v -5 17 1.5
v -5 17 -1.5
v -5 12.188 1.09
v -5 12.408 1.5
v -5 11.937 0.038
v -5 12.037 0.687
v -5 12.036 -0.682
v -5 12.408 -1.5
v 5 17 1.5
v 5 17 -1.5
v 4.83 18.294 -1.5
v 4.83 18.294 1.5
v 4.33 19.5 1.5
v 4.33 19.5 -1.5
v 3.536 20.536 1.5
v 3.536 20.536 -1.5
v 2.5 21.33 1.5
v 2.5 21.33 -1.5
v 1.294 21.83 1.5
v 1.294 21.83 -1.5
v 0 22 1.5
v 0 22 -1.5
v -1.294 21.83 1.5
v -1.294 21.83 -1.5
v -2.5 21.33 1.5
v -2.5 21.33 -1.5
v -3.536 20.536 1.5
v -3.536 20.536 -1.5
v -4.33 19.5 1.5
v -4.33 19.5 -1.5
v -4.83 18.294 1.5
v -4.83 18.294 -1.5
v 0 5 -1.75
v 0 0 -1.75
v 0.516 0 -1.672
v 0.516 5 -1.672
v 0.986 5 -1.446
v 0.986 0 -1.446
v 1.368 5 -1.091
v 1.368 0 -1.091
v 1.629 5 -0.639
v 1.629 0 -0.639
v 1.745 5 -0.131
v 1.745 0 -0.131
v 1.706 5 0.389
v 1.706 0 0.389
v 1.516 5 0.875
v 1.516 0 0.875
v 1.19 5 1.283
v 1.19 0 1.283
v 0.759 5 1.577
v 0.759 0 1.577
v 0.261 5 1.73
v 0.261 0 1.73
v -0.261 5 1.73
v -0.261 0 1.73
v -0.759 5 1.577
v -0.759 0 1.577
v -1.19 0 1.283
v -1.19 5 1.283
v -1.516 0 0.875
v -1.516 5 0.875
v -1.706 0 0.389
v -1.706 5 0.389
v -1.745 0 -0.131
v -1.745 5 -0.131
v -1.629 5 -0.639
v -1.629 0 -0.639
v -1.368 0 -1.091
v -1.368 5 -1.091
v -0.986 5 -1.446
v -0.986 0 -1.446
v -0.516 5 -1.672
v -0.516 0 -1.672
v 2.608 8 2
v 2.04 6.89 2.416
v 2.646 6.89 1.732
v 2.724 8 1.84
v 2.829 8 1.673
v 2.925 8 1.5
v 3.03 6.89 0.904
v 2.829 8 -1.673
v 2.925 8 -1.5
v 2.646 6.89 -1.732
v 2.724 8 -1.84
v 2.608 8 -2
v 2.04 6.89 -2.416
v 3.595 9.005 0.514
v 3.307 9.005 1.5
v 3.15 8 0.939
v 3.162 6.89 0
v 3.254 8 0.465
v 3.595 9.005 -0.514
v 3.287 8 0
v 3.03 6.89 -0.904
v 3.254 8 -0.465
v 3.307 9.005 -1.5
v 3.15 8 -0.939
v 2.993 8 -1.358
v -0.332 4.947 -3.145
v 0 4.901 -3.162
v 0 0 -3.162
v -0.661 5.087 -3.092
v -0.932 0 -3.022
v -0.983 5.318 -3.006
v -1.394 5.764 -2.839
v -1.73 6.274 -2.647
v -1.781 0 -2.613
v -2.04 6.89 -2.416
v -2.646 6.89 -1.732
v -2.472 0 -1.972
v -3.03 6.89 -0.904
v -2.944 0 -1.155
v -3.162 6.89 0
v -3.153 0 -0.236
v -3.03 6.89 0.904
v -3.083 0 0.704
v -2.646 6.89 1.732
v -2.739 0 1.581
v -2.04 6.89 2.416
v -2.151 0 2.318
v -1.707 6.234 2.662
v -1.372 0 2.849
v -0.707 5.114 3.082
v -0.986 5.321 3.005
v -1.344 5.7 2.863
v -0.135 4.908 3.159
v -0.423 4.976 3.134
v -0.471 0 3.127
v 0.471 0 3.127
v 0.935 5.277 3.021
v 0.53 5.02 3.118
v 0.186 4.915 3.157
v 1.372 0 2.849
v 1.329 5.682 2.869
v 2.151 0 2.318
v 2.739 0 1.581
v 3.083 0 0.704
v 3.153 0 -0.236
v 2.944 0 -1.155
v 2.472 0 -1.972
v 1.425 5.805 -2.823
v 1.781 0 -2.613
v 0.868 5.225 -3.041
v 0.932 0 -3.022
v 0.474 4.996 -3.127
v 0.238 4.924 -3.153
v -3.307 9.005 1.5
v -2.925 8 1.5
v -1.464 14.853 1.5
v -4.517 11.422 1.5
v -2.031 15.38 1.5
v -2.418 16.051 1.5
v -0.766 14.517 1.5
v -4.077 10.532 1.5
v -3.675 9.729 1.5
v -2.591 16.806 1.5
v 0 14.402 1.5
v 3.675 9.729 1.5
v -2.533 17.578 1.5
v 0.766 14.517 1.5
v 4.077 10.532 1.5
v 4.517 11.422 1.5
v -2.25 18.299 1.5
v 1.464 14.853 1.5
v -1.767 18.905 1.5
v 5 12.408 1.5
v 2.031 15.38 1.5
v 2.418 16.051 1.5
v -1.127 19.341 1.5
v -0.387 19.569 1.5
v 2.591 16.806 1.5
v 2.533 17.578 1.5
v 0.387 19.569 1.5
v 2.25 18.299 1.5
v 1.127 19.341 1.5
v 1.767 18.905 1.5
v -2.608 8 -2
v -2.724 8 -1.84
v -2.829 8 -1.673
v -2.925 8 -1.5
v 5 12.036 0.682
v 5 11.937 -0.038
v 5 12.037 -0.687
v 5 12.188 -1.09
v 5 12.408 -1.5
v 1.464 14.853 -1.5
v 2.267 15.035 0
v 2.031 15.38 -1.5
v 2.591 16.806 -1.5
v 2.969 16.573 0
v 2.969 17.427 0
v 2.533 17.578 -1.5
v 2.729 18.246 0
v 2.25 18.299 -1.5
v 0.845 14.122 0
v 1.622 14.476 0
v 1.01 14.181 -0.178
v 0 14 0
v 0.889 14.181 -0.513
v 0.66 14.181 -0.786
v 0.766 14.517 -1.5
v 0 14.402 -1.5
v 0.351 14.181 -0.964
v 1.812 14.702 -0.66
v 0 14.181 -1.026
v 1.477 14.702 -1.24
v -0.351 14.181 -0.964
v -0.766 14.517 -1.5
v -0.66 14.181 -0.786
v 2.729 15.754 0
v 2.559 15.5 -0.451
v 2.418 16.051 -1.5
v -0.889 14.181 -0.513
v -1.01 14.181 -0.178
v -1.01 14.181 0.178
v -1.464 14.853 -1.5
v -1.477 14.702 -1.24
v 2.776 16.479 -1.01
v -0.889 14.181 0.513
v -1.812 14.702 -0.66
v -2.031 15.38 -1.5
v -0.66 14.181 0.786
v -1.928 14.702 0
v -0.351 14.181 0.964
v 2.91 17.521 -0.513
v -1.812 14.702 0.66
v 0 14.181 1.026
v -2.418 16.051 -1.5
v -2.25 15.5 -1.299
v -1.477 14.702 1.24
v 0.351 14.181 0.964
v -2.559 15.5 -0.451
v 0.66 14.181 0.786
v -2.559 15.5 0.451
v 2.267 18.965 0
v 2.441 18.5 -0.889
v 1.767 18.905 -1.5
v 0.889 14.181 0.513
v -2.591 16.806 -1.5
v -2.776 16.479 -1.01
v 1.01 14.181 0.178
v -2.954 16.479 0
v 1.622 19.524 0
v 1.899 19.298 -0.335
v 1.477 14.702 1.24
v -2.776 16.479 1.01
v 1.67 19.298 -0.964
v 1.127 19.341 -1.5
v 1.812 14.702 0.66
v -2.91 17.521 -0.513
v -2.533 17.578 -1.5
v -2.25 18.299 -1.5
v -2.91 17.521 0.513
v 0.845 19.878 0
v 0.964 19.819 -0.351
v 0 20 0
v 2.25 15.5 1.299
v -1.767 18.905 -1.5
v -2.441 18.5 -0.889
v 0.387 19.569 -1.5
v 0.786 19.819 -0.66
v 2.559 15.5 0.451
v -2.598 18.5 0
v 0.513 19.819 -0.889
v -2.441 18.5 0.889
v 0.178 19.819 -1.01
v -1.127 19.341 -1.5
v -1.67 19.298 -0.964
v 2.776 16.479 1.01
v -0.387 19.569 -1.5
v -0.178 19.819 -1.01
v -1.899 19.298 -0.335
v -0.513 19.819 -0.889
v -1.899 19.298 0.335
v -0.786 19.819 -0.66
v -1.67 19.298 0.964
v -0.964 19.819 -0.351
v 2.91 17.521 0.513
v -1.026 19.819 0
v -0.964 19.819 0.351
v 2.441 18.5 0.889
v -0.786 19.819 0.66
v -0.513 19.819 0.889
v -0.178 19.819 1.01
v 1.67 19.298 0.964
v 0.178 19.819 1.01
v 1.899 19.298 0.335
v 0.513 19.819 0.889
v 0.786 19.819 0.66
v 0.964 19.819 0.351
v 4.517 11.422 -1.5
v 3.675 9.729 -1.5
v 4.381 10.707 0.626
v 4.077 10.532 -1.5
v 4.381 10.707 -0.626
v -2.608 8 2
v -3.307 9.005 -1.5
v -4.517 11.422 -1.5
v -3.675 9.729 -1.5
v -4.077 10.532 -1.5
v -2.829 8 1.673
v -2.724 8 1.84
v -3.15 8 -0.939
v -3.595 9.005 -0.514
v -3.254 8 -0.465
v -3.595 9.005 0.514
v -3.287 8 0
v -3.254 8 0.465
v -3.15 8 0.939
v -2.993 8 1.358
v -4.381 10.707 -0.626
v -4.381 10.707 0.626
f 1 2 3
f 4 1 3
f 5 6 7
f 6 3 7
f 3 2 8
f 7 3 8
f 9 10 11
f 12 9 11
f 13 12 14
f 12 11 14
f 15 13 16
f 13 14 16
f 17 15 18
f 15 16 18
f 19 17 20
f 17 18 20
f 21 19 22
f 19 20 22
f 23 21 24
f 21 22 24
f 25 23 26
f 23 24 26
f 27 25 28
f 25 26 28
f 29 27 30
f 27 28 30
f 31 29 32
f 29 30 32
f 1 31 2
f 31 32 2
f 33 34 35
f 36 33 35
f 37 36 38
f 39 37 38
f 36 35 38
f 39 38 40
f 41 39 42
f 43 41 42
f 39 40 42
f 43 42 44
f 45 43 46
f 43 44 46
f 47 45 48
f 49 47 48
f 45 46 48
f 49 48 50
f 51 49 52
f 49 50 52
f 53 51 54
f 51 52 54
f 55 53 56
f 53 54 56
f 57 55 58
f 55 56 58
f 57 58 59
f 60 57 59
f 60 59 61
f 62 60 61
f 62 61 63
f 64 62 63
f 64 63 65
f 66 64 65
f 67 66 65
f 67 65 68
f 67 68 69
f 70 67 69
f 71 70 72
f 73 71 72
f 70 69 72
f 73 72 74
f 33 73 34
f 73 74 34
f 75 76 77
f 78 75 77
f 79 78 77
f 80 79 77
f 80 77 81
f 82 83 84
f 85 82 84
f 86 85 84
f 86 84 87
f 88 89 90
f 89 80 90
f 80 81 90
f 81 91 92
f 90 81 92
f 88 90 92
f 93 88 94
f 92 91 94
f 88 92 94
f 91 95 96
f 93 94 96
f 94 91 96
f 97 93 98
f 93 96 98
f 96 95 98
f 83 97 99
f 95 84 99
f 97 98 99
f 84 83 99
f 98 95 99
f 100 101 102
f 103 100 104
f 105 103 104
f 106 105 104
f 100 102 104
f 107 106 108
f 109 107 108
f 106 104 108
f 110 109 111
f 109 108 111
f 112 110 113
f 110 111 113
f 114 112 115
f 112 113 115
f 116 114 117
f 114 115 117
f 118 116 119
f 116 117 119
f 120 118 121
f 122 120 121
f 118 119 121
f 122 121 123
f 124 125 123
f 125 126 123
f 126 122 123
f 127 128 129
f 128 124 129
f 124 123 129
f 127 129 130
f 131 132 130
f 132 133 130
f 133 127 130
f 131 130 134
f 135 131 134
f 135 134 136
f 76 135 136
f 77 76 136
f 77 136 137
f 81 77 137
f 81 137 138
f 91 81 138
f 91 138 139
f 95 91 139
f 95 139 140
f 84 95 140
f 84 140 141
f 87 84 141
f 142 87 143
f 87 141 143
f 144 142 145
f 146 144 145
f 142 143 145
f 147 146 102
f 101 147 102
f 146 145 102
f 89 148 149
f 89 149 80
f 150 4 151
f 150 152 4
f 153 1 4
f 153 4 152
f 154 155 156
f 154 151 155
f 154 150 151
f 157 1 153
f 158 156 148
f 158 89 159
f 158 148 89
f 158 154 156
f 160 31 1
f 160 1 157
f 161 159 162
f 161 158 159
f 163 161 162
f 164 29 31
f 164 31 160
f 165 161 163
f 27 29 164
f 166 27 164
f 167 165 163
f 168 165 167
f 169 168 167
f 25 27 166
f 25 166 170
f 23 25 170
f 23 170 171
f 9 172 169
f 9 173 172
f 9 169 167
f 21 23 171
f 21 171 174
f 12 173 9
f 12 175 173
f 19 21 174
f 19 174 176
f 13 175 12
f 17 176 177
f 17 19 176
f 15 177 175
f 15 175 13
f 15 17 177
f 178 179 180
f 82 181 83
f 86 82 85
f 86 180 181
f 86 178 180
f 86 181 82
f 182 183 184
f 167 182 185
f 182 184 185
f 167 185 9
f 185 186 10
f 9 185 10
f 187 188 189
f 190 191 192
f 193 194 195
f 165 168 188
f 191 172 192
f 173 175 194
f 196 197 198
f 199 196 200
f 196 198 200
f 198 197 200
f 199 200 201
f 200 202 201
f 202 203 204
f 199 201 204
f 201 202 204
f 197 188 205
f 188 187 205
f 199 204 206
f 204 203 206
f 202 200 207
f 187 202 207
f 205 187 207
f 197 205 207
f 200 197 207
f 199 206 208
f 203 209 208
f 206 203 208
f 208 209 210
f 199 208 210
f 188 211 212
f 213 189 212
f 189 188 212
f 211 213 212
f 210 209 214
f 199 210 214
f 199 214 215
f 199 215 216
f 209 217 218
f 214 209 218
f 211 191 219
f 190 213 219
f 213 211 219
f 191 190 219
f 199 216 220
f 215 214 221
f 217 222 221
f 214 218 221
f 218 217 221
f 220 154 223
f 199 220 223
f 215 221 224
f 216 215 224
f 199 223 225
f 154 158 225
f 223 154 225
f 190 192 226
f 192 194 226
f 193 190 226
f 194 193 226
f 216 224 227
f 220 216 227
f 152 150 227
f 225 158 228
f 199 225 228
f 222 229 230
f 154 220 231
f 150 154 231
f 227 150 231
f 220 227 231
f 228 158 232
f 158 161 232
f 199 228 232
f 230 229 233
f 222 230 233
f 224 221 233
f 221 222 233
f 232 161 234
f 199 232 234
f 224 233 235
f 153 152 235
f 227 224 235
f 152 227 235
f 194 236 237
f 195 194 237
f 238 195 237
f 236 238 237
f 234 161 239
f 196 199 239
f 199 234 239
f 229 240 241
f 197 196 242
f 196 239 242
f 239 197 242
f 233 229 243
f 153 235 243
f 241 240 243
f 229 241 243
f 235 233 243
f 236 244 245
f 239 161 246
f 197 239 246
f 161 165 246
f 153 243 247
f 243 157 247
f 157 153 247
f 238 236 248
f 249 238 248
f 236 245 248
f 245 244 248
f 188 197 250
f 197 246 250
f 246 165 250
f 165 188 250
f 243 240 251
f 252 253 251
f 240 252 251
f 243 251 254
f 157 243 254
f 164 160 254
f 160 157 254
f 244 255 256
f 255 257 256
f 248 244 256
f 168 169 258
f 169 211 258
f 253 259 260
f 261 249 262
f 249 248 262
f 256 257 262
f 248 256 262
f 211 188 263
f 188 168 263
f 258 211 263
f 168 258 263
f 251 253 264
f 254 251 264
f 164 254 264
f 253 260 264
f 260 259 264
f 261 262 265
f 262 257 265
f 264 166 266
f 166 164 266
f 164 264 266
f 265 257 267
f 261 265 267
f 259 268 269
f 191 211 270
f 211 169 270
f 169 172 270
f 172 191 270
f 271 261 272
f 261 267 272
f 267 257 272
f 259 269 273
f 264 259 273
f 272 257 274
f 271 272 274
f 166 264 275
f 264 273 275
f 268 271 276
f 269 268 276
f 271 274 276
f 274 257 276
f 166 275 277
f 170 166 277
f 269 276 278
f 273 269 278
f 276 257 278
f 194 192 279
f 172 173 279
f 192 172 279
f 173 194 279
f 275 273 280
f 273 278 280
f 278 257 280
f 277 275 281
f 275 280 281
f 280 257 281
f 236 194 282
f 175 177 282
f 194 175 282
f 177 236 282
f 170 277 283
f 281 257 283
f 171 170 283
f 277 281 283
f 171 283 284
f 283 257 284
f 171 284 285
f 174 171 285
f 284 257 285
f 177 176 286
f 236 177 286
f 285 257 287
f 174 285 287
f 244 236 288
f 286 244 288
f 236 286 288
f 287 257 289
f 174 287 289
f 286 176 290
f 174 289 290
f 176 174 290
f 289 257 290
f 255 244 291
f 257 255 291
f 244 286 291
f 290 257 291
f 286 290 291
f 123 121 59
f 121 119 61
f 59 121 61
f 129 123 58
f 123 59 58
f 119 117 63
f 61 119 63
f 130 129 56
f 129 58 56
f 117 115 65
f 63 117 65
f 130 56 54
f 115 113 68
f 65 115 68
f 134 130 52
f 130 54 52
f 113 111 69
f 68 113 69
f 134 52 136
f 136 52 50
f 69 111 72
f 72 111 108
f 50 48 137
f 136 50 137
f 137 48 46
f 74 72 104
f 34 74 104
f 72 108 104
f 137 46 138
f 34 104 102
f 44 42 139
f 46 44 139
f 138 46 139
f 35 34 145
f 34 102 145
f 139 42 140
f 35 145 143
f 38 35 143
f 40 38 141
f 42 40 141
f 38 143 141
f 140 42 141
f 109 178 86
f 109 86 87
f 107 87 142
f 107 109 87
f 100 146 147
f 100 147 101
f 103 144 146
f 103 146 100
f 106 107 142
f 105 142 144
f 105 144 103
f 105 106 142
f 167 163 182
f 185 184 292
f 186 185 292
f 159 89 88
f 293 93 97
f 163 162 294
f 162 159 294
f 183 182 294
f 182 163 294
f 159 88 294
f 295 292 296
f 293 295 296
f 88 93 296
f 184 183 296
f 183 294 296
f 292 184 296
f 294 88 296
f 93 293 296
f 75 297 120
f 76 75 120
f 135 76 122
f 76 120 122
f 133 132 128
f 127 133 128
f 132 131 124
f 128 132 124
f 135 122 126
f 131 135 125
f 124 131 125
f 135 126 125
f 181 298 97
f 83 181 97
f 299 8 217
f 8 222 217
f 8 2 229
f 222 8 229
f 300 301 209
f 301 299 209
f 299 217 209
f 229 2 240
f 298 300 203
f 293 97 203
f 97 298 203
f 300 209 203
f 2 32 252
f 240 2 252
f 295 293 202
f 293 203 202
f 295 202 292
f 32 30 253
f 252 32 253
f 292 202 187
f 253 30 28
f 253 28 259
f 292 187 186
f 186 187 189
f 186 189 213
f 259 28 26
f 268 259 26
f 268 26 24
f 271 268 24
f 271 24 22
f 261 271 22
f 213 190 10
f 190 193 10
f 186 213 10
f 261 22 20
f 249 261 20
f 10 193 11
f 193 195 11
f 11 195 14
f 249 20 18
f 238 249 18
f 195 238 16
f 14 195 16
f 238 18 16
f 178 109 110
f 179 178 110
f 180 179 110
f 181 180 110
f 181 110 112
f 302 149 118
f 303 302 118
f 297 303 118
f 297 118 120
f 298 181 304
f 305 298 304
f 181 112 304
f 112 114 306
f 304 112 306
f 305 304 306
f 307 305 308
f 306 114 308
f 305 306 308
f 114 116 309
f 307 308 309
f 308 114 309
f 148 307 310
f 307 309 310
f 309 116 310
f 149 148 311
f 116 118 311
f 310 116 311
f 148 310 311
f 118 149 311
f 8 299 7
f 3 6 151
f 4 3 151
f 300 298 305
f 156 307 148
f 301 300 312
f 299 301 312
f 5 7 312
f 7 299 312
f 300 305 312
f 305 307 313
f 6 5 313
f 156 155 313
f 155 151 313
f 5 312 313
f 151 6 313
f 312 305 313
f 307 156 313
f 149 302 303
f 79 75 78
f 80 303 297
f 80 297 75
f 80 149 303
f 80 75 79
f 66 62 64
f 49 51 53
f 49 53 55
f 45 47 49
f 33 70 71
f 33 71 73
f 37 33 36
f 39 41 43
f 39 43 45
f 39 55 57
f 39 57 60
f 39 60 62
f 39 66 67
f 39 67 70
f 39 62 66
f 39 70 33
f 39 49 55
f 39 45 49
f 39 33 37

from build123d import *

# Parameters (mm, degrees)
BOSS_EXTRUDE1_DEPTH      = 1.5
BOSS_EXTRUDE1_DEPTH_BACK = 1.5
SKETCH3_R                = 3.5
BOSS_EXTRUDE2_DEPTH      = 8
CUT_EXTRUDE2_DEPTH       = 23.830900114
CUT_EXTRUDE2_DEPTH_BACK  = 23.830900114
SKETCH8_R                = 1.75
CUT_EXTRUDE3_DEPTH       = 5


with BuildPart() as part:
    # Sketch1 → Boss-Extrude1 (new, two sides: drawn at the far end of the back side and taken through both)
    with BuildSketch(Plane.XY.offset(-BOSS_EXTRUDE1_DEPTH_BACK)):
        with BuildLine():
            Line((-3.5, 8.5), (-3.5, 0))
            Line((-3.5, 0), (3.5, 0))
            Line((3.5, 0), (3.5, 8.5))
            Line((3.5, 8.5), (5, 11.8))
            Line((5, 11.8), (5, 17))
            ThreePointArc((5, 17), (0, 22), (-5, 17))
            Line((-5, 17), (-5, 11.8))
            Line((-5, 11.8), (-3.5, 8.5))
        make_face()
    extrude(amount=BOSS_EXTRUDE1_DEPTH + BOSS_EXTRUDE1_DEPTH_BACK)

    # Sketch3 → Boss-Extrude2 (add)
    with BuildSketch(Plane(origin=(0, 0, 0), x_dir=(1, 0, 0), z_dir=(0, 1, 0))):
        Circle(SKETCH3_R)
    extrude(amount=BOSS_EXTRUDE2_DEPTH)

    # Sketch5 → Cut-Extrude2 (cut, two sides: drawn at the far end of the back side and taken through both)
    with BuildSketch(Plane(origin=(0, 0, 0), x_dir=(0, 0, -1), z_dir=(1, 0, 0)).offset(-CUT_EXTRUDE2_DEPTH_BACK)):
        Polygon((2, 8), (3.5, 4), (3.5, 8), align=None)
        Polygon((-3.5, 8), (-2, 8), (-3.5, 4), align=None)
    extrude(amount=CUT_EXTRUDE2_DEPTH + CUT_EXTRUDE2_DEPTH_BACK, mode=Mode.SUBTRACT)

    # Sketch6 → Cut-Revolve1 (revolve, cut)
    with BuildSketch(Plane.XY):
        with BuildLine():
            Line((7.363636364, 17), (3.631624104, 9.005417126))
            ThreePointArc((3.631624104, 9.005417126), (3.281024349, 7.973648404), (3.16227766, 6.890428154))
            Line((3.16227766, 6.890428154), (3.16227766, 0))
            Line((3.16227766, 0), (7.363636364, 0))
            Line((7.363636364, 0), (7.363636364, 17))
        make_face()
    revolve(axis=Axis((0, 0, 0), (0, 1, 0)), mode=Mode.SUBTRACT)

    # Sketch7 → Cut-Revolve2 (revolve, cut)
    with BuildSketch(Plane.XY):
        with BuildLine():
            Line((0, 20), (0, 14))
            ThreePointArc((0, 14), (3, 17), (0, 20))
        make_face()
    revolve(axis=Axis((0, 0, 0), (0, 1, 0)), mode=Mode.SUBTRACT)

    # Sketch8 → Cut-Extrude3 (cut)
    with BuildSketch(Plane.XZ):
        Circle(SKETCH8_R)
    extrude(amount=-CUT_EXTRUDE3_DEPTH, mode=Mode.SUBTRACT)


solid = part.part
